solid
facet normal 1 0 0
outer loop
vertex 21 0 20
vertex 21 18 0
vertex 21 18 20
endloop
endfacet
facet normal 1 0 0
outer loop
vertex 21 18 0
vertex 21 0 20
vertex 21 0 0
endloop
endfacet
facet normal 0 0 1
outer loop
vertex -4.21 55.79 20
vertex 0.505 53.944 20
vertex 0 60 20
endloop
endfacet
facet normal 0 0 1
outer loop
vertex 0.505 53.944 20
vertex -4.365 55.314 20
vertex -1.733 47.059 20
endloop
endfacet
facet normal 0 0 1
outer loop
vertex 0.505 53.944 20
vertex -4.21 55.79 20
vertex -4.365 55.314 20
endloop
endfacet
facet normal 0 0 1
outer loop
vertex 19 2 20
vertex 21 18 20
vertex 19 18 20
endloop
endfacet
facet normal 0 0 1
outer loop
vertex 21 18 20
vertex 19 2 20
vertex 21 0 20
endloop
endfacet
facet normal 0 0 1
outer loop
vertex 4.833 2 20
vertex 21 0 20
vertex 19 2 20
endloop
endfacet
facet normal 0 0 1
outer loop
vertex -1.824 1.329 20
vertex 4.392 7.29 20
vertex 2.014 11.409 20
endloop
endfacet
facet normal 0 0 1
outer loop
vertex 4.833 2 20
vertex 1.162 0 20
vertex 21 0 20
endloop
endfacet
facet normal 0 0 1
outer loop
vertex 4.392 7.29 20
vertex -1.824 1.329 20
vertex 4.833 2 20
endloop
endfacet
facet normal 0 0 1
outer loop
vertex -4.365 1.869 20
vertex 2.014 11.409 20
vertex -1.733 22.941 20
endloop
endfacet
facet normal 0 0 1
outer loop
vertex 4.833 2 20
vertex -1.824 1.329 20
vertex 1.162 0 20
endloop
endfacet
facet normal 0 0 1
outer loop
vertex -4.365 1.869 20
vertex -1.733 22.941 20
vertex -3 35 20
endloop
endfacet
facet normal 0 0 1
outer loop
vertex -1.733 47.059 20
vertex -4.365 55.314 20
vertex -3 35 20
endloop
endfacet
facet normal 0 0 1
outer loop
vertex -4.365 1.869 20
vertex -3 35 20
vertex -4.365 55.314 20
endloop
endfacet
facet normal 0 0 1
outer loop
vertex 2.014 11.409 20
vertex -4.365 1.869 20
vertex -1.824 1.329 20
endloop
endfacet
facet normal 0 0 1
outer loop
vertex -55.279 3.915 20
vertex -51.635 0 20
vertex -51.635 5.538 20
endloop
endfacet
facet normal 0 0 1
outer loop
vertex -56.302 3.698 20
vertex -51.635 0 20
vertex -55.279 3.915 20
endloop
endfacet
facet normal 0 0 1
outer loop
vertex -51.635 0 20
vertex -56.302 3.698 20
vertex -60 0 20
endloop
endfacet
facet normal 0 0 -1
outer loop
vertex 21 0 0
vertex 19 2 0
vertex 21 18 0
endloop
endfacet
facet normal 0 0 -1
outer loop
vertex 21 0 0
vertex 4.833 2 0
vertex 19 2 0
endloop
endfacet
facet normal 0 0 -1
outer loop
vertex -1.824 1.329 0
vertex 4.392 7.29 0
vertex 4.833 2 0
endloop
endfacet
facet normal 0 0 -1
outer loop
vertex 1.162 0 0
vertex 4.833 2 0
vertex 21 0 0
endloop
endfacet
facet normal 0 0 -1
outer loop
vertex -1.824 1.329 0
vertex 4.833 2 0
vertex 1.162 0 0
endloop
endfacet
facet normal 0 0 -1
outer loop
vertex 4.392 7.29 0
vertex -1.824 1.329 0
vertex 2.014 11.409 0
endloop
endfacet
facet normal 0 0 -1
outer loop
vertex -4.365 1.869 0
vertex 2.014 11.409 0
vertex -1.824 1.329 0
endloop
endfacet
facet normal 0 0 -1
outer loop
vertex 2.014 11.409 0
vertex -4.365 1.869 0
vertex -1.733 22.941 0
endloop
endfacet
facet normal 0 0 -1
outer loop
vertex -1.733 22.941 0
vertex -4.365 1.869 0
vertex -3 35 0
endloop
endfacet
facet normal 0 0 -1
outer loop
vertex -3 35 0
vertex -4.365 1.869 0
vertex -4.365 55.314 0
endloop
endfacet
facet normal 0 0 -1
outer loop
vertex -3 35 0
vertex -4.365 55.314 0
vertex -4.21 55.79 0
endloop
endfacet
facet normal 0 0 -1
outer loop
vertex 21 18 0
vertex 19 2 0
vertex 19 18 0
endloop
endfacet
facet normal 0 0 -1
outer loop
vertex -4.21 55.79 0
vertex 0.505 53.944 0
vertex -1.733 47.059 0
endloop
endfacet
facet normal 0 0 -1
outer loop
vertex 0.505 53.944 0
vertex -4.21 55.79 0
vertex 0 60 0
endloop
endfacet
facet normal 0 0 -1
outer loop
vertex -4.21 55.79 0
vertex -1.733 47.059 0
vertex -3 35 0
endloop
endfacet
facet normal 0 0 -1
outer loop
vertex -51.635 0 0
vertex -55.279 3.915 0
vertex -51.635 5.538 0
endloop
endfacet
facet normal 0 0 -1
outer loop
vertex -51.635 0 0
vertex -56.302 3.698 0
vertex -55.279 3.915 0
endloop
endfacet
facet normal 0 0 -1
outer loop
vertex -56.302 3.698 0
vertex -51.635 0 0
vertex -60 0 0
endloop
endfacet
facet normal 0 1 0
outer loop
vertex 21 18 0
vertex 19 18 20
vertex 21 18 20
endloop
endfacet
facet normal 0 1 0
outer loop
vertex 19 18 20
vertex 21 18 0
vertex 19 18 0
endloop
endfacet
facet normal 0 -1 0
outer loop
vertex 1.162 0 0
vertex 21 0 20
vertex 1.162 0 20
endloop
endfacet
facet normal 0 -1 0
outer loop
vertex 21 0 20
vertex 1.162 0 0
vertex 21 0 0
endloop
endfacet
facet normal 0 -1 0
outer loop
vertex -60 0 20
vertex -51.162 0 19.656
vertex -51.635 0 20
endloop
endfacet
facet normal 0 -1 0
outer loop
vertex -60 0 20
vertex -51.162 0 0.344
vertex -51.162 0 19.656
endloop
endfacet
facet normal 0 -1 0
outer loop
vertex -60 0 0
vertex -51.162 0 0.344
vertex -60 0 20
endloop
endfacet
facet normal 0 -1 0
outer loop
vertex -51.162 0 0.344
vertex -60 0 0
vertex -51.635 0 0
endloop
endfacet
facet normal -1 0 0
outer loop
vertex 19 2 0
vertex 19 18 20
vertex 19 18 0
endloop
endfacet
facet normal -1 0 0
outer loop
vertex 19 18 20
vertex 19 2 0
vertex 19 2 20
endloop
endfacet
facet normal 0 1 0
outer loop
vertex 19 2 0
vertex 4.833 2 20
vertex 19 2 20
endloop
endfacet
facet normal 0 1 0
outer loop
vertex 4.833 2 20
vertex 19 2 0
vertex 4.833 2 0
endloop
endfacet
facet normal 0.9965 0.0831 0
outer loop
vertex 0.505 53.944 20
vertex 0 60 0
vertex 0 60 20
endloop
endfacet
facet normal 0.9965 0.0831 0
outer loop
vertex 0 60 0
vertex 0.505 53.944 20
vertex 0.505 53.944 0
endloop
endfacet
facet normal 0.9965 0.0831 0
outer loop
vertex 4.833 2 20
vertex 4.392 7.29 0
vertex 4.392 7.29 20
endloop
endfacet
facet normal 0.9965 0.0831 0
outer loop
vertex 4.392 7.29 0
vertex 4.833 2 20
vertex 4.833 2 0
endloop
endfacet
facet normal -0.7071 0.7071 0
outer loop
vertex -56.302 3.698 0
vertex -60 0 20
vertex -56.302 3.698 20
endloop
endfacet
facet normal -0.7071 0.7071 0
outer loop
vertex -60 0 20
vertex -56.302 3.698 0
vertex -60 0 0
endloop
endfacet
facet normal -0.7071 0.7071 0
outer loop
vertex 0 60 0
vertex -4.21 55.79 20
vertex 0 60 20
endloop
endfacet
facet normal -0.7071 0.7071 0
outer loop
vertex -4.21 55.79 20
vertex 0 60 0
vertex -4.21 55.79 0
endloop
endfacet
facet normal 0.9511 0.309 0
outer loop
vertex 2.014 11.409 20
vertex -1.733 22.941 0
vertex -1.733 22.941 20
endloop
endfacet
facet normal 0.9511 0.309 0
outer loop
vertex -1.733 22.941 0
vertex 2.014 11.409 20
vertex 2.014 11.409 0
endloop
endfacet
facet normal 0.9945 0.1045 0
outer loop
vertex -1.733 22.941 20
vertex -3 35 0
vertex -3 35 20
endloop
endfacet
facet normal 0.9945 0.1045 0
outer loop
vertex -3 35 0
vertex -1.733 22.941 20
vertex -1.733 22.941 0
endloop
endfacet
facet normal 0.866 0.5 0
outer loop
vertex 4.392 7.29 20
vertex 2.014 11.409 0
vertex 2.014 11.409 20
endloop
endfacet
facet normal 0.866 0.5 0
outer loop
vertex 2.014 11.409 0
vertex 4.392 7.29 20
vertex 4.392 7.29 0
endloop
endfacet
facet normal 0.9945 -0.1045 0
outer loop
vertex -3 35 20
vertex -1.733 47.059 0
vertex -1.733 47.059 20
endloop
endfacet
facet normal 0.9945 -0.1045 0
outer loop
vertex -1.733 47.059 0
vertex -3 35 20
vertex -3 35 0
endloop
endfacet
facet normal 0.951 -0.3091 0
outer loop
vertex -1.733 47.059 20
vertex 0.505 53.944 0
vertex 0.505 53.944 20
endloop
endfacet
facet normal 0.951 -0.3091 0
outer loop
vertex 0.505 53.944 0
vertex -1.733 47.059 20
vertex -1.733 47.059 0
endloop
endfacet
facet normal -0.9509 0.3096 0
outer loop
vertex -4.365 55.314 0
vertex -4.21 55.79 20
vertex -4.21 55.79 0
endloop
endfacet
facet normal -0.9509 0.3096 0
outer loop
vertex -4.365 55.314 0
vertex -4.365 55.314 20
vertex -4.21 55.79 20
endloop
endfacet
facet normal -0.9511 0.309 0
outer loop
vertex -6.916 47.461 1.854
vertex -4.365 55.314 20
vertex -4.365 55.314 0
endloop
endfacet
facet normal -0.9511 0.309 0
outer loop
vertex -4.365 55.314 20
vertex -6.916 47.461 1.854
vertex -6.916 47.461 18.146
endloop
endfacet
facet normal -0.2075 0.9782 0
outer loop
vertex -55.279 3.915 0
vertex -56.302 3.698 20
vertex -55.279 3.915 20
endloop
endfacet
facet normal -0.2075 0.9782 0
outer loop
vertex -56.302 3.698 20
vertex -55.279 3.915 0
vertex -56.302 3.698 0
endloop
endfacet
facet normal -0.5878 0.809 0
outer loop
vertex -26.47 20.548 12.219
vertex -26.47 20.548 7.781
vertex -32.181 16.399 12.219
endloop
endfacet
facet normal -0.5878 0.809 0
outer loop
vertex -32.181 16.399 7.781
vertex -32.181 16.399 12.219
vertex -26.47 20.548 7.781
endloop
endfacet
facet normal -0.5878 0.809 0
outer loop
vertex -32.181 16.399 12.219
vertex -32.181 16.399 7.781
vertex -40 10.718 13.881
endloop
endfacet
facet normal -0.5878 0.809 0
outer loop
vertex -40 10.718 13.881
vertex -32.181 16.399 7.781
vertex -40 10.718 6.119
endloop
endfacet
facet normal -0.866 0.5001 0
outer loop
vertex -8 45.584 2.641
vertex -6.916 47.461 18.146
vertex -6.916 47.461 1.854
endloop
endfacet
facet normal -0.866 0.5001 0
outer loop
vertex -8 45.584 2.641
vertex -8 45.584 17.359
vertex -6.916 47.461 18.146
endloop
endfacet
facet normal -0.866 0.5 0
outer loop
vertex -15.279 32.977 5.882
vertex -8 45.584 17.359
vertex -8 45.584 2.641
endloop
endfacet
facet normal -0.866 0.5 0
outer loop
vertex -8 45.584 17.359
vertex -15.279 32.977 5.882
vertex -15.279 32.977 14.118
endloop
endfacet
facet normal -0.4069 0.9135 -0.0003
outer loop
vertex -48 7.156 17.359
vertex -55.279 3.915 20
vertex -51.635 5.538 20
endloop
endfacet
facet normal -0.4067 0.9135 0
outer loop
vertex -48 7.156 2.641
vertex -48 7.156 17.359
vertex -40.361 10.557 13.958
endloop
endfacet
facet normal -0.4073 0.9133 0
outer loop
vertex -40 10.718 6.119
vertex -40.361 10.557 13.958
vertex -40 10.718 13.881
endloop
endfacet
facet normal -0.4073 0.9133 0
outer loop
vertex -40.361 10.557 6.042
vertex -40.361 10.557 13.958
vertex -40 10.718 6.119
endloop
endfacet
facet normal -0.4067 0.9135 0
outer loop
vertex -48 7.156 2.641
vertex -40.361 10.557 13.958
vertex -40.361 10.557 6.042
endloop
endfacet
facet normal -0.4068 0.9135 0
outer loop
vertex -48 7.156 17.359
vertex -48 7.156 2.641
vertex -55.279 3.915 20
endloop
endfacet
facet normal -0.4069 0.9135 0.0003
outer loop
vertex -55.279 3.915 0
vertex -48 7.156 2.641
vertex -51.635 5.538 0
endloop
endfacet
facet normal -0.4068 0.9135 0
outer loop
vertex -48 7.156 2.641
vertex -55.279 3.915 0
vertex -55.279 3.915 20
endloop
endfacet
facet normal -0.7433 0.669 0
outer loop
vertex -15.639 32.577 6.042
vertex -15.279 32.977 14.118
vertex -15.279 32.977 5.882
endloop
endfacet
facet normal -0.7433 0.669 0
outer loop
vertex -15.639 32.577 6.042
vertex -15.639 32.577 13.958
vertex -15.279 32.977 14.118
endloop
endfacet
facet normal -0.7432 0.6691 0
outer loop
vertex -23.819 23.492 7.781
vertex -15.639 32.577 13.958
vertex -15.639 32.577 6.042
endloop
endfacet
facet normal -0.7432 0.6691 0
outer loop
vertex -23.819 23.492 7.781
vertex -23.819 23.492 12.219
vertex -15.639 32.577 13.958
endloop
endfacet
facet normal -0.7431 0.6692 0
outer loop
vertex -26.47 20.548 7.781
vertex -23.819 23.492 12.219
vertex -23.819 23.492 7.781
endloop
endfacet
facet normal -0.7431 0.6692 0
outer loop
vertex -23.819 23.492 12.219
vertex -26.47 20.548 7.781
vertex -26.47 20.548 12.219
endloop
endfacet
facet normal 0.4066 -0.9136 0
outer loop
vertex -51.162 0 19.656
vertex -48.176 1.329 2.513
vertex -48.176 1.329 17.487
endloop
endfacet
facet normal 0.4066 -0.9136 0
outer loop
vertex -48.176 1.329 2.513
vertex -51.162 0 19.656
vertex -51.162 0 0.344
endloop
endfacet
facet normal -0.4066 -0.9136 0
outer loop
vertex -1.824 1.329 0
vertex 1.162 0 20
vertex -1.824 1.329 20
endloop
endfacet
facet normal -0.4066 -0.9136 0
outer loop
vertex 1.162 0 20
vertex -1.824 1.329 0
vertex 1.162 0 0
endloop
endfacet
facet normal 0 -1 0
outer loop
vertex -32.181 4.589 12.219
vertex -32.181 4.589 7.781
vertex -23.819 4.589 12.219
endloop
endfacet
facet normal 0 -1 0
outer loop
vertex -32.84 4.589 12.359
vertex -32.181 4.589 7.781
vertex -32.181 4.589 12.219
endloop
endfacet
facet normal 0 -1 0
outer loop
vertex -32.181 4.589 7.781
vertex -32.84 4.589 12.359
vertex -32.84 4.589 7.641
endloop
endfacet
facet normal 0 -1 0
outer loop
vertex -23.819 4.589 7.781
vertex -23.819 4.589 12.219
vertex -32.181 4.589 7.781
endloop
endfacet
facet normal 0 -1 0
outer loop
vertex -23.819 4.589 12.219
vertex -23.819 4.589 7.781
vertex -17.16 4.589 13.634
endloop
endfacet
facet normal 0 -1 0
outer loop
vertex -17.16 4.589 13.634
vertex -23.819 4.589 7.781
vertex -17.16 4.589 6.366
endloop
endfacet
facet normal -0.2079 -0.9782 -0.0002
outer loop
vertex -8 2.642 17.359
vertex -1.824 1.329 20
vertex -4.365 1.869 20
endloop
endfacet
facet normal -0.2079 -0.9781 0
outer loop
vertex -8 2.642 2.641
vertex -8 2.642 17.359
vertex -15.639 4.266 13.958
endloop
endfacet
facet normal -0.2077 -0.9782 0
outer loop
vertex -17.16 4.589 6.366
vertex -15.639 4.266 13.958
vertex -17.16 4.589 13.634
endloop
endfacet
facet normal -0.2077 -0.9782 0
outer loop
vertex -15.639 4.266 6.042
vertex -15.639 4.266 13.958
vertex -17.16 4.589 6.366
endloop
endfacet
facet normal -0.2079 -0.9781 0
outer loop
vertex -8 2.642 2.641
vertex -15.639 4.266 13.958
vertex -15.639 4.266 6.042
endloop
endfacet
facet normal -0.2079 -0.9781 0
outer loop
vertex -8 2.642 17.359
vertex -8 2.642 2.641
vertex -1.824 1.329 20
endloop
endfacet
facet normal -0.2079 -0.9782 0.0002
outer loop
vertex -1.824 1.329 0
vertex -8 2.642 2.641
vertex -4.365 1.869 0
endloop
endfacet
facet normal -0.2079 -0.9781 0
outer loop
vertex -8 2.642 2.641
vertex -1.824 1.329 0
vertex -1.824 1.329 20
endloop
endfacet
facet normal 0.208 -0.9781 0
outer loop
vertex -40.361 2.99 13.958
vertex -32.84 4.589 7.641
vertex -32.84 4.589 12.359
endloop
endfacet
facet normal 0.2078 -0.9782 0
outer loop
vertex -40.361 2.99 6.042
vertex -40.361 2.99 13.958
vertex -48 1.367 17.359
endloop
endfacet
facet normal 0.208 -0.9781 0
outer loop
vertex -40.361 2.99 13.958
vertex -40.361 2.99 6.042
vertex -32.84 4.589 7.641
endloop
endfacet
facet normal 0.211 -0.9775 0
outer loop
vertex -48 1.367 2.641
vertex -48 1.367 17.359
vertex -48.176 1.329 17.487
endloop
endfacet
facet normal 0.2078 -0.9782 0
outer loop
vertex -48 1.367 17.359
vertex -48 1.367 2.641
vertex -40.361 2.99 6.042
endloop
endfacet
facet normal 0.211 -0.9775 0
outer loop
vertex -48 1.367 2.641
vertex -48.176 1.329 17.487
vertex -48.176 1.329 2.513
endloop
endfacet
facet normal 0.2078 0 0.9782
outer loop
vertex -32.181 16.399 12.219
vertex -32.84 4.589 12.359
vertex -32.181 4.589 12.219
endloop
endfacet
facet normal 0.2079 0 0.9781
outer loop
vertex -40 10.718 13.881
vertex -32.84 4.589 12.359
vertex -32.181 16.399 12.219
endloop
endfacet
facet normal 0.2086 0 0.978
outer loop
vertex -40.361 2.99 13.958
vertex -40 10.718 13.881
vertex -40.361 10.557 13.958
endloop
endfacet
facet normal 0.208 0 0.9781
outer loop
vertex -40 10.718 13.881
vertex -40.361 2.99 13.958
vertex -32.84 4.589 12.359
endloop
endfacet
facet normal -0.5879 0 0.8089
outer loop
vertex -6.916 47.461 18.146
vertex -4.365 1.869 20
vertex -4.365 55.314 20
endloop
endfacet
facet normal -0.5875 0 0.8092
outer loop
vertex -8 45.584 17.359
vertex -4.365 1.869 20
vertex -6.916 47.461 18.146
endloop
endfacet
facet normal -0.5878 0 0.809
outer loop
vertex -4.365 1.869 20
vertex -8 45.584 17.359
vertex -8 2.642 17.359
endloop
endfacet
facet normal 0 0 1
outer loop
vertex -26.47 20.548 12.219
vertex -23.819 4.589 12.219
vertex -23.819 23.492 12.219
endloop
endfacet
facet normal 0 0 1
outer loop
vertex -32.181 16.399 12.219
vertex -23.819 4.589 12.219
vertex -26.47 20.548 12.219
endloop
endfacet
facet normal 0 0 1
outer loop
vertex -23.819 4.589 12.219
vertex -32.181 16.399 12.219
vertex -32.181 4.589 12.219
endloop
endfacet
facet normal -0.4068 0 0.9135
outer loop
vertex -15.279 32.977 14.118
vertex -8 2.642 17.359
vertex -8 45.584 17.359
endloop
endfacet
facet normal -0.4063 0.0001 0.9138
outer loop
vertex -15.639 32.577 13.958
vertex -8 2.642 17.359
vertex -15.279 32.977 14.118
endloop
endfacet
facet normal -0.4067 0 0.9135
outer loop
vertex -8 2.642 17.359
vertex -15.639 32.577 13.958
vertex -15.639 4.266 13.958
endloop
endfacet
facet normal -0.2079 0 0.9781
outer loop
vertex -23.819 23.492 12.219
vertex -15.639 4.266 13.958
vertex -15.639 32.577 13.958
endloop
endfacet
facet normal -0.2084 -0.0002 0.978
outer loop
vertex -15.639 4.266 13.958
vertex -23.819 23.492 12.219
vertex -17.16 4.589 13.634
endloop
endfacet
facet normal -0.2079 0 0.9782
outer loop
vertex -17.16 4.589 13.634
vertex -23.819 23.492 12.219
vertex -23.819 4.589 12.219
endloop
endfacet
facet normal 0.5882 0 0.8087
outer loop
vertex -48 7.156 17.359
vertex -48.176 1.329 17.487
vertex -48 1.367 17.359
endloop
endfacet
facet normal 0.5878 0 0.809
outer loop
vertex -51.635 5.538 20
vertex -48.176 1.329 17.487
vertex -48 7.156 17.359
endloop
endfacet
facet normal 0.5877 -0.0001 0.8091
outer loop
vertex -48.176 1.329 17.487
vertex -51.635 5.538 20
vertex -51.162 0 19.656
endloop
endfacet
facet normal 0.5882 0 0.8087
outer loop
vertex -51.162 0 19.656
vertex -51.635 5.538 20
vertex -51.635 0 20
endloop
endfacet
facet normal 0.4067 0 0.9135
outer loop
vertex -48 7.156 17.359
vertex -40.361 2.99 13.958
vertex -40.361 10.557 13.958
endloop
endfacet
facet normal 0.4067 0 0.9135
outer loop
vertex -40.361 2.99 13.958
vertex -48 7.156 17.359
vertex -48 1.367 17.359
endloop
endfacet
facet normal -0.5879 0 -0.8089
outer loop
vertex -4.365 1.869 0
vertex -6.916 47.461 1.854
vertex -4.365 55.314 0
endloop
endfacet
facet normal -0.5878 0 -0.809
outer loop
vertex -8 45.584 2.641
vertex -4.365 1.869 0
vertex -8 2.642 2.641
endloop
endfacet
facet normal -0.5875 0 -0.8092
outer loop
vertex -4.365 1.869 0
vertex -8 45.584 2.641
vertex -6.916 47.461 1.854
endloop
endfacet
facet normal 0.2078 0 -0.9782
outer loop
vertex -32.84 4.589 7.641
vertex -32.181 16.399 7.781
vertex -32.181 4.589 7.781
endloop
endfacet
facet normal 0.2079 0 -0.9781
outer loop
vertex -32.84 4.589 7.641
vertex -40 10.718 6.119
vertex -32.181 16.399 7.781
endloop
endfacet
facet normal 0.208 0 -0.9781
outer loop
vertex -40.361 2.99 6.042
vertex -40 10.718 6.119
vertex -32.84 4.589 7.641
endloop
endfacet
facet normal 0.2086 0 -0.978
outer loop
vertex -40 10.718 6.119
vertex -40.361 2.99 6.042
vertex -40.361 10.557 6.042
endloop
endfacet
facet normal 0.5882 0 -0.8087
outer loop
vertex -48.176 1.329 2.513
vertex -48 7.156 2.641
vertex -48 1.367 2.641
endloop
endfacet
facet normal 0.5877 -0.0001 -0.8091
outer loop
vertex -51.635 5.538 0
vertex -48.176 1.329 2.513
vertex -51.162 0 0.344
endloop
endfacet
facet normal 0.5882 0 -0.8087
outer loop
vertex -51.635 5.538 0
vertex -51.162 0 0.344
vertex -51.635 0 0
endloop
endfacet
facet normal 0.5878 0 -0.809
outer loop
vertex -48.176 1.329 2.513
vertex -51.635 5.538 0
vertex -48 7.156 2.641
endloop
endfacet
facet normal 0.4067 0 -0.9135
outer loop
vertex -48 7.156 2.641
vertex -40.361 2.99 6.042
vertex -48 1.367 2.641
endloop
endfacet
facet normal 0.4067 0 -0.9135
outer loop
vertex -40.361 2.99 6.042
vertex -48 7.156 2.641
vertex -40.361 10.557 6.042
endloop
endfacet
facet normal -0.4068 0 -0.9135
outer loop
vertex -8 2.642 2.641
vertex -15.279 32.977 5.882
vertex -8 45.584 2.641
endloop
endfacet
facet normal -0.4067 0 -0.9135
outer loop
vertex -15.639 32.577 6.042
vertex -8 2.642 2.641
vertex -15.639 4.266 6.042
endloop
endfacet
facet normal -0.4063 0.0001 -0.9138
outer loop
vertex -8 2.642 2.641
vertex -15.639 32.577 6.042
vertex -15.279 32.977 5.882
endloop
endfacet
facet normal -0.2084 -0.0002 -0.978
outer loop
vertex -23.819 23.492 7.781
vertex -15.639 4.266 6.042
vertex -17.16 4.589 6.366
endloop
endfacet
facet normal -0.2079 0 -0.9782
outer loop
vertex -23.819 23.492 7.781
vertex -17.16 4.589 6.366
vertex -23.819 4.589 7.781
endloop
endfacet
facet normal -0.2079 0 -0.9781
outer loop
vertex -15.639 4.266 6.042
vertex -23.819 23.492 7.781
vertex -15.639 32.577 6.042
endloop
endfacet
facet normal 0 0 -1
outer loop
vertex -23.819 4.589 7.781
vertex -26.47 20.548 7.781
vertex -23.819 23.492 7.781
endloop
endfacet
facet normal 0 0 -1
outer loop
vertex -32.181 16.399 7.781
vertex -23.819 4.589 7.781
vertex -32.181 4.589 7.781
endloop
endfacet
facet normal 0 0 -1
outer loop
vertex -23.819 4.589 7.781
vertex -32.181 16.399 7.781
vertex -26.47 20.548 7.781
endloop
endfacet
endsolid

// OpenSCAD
// holder
translate([4, 0])
    difference() {
        cube([17, 18, 20]);
        translate([0, 2, 0]) {
            cube([15, 18, 20]);
        }
    }

// back support
mainObj = [
    [-60, 0],
    [5, 0],
    [0, 60]
];

difference() {
    linear_extrude(20) {
        polygon(mainObj);
    }
    
    translate([55, 35]) {
        cylinder(20, 58, 58);
    }
    
    translate([-80, 80]) {
        cylinder(20, 80, 80);
    }
    
    translate([-25, -70]) {
        cylinder(20, 75, 75);
    }
    
    translate([-28, 60, 52]) {
        rotate([90, 0, 0]) {  
            cylinder(60, 40, 40);
        }
    }
    
    translate([-28, 60, -32]) {
        rotate([90, 0, 0]) {  
            cylinder(60, 40, 40);
        }
    }

}
